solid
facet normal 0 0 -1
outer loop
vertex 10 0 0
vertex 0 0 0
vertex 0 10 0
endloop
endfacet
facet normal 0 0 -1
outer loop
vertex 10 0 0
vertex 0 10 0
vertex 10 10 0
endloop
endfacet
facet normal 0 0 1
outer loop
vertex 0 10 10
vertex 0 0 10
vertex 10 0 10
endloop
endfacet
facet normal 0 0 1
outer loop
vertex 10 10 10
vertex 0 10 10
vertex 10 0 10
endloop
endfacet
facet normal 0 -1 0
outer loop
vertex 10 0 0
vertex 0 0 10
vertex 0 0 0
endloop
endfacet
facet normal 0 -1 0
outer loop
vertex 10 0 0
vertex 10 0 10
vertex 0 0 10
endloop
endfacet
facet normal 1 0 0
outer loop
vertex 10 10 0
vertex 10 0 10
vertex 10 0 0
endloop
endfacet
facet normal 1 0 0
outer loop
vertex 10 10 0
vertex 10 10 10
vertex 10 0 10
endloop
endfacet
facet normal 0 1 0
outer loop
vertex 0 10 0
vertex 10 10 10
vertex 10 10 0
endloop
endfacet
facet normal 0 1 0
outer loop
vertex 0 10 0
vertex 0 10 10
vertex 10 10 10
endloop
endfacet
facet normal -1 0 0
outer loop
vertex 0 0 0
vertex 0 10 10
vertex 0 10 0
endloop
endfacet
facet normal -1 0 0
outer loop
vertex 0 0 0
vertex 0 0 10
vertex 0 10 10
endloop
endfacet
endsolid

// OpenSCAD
// `segments=` subdivides the profile outline even with no twist at all — the
// $fn/$fa/$fs refinement only kicks in when twisting, but an explicit
// `segments=` is always honoured.
linear_extrude(height=10, segments=8) square(10);
